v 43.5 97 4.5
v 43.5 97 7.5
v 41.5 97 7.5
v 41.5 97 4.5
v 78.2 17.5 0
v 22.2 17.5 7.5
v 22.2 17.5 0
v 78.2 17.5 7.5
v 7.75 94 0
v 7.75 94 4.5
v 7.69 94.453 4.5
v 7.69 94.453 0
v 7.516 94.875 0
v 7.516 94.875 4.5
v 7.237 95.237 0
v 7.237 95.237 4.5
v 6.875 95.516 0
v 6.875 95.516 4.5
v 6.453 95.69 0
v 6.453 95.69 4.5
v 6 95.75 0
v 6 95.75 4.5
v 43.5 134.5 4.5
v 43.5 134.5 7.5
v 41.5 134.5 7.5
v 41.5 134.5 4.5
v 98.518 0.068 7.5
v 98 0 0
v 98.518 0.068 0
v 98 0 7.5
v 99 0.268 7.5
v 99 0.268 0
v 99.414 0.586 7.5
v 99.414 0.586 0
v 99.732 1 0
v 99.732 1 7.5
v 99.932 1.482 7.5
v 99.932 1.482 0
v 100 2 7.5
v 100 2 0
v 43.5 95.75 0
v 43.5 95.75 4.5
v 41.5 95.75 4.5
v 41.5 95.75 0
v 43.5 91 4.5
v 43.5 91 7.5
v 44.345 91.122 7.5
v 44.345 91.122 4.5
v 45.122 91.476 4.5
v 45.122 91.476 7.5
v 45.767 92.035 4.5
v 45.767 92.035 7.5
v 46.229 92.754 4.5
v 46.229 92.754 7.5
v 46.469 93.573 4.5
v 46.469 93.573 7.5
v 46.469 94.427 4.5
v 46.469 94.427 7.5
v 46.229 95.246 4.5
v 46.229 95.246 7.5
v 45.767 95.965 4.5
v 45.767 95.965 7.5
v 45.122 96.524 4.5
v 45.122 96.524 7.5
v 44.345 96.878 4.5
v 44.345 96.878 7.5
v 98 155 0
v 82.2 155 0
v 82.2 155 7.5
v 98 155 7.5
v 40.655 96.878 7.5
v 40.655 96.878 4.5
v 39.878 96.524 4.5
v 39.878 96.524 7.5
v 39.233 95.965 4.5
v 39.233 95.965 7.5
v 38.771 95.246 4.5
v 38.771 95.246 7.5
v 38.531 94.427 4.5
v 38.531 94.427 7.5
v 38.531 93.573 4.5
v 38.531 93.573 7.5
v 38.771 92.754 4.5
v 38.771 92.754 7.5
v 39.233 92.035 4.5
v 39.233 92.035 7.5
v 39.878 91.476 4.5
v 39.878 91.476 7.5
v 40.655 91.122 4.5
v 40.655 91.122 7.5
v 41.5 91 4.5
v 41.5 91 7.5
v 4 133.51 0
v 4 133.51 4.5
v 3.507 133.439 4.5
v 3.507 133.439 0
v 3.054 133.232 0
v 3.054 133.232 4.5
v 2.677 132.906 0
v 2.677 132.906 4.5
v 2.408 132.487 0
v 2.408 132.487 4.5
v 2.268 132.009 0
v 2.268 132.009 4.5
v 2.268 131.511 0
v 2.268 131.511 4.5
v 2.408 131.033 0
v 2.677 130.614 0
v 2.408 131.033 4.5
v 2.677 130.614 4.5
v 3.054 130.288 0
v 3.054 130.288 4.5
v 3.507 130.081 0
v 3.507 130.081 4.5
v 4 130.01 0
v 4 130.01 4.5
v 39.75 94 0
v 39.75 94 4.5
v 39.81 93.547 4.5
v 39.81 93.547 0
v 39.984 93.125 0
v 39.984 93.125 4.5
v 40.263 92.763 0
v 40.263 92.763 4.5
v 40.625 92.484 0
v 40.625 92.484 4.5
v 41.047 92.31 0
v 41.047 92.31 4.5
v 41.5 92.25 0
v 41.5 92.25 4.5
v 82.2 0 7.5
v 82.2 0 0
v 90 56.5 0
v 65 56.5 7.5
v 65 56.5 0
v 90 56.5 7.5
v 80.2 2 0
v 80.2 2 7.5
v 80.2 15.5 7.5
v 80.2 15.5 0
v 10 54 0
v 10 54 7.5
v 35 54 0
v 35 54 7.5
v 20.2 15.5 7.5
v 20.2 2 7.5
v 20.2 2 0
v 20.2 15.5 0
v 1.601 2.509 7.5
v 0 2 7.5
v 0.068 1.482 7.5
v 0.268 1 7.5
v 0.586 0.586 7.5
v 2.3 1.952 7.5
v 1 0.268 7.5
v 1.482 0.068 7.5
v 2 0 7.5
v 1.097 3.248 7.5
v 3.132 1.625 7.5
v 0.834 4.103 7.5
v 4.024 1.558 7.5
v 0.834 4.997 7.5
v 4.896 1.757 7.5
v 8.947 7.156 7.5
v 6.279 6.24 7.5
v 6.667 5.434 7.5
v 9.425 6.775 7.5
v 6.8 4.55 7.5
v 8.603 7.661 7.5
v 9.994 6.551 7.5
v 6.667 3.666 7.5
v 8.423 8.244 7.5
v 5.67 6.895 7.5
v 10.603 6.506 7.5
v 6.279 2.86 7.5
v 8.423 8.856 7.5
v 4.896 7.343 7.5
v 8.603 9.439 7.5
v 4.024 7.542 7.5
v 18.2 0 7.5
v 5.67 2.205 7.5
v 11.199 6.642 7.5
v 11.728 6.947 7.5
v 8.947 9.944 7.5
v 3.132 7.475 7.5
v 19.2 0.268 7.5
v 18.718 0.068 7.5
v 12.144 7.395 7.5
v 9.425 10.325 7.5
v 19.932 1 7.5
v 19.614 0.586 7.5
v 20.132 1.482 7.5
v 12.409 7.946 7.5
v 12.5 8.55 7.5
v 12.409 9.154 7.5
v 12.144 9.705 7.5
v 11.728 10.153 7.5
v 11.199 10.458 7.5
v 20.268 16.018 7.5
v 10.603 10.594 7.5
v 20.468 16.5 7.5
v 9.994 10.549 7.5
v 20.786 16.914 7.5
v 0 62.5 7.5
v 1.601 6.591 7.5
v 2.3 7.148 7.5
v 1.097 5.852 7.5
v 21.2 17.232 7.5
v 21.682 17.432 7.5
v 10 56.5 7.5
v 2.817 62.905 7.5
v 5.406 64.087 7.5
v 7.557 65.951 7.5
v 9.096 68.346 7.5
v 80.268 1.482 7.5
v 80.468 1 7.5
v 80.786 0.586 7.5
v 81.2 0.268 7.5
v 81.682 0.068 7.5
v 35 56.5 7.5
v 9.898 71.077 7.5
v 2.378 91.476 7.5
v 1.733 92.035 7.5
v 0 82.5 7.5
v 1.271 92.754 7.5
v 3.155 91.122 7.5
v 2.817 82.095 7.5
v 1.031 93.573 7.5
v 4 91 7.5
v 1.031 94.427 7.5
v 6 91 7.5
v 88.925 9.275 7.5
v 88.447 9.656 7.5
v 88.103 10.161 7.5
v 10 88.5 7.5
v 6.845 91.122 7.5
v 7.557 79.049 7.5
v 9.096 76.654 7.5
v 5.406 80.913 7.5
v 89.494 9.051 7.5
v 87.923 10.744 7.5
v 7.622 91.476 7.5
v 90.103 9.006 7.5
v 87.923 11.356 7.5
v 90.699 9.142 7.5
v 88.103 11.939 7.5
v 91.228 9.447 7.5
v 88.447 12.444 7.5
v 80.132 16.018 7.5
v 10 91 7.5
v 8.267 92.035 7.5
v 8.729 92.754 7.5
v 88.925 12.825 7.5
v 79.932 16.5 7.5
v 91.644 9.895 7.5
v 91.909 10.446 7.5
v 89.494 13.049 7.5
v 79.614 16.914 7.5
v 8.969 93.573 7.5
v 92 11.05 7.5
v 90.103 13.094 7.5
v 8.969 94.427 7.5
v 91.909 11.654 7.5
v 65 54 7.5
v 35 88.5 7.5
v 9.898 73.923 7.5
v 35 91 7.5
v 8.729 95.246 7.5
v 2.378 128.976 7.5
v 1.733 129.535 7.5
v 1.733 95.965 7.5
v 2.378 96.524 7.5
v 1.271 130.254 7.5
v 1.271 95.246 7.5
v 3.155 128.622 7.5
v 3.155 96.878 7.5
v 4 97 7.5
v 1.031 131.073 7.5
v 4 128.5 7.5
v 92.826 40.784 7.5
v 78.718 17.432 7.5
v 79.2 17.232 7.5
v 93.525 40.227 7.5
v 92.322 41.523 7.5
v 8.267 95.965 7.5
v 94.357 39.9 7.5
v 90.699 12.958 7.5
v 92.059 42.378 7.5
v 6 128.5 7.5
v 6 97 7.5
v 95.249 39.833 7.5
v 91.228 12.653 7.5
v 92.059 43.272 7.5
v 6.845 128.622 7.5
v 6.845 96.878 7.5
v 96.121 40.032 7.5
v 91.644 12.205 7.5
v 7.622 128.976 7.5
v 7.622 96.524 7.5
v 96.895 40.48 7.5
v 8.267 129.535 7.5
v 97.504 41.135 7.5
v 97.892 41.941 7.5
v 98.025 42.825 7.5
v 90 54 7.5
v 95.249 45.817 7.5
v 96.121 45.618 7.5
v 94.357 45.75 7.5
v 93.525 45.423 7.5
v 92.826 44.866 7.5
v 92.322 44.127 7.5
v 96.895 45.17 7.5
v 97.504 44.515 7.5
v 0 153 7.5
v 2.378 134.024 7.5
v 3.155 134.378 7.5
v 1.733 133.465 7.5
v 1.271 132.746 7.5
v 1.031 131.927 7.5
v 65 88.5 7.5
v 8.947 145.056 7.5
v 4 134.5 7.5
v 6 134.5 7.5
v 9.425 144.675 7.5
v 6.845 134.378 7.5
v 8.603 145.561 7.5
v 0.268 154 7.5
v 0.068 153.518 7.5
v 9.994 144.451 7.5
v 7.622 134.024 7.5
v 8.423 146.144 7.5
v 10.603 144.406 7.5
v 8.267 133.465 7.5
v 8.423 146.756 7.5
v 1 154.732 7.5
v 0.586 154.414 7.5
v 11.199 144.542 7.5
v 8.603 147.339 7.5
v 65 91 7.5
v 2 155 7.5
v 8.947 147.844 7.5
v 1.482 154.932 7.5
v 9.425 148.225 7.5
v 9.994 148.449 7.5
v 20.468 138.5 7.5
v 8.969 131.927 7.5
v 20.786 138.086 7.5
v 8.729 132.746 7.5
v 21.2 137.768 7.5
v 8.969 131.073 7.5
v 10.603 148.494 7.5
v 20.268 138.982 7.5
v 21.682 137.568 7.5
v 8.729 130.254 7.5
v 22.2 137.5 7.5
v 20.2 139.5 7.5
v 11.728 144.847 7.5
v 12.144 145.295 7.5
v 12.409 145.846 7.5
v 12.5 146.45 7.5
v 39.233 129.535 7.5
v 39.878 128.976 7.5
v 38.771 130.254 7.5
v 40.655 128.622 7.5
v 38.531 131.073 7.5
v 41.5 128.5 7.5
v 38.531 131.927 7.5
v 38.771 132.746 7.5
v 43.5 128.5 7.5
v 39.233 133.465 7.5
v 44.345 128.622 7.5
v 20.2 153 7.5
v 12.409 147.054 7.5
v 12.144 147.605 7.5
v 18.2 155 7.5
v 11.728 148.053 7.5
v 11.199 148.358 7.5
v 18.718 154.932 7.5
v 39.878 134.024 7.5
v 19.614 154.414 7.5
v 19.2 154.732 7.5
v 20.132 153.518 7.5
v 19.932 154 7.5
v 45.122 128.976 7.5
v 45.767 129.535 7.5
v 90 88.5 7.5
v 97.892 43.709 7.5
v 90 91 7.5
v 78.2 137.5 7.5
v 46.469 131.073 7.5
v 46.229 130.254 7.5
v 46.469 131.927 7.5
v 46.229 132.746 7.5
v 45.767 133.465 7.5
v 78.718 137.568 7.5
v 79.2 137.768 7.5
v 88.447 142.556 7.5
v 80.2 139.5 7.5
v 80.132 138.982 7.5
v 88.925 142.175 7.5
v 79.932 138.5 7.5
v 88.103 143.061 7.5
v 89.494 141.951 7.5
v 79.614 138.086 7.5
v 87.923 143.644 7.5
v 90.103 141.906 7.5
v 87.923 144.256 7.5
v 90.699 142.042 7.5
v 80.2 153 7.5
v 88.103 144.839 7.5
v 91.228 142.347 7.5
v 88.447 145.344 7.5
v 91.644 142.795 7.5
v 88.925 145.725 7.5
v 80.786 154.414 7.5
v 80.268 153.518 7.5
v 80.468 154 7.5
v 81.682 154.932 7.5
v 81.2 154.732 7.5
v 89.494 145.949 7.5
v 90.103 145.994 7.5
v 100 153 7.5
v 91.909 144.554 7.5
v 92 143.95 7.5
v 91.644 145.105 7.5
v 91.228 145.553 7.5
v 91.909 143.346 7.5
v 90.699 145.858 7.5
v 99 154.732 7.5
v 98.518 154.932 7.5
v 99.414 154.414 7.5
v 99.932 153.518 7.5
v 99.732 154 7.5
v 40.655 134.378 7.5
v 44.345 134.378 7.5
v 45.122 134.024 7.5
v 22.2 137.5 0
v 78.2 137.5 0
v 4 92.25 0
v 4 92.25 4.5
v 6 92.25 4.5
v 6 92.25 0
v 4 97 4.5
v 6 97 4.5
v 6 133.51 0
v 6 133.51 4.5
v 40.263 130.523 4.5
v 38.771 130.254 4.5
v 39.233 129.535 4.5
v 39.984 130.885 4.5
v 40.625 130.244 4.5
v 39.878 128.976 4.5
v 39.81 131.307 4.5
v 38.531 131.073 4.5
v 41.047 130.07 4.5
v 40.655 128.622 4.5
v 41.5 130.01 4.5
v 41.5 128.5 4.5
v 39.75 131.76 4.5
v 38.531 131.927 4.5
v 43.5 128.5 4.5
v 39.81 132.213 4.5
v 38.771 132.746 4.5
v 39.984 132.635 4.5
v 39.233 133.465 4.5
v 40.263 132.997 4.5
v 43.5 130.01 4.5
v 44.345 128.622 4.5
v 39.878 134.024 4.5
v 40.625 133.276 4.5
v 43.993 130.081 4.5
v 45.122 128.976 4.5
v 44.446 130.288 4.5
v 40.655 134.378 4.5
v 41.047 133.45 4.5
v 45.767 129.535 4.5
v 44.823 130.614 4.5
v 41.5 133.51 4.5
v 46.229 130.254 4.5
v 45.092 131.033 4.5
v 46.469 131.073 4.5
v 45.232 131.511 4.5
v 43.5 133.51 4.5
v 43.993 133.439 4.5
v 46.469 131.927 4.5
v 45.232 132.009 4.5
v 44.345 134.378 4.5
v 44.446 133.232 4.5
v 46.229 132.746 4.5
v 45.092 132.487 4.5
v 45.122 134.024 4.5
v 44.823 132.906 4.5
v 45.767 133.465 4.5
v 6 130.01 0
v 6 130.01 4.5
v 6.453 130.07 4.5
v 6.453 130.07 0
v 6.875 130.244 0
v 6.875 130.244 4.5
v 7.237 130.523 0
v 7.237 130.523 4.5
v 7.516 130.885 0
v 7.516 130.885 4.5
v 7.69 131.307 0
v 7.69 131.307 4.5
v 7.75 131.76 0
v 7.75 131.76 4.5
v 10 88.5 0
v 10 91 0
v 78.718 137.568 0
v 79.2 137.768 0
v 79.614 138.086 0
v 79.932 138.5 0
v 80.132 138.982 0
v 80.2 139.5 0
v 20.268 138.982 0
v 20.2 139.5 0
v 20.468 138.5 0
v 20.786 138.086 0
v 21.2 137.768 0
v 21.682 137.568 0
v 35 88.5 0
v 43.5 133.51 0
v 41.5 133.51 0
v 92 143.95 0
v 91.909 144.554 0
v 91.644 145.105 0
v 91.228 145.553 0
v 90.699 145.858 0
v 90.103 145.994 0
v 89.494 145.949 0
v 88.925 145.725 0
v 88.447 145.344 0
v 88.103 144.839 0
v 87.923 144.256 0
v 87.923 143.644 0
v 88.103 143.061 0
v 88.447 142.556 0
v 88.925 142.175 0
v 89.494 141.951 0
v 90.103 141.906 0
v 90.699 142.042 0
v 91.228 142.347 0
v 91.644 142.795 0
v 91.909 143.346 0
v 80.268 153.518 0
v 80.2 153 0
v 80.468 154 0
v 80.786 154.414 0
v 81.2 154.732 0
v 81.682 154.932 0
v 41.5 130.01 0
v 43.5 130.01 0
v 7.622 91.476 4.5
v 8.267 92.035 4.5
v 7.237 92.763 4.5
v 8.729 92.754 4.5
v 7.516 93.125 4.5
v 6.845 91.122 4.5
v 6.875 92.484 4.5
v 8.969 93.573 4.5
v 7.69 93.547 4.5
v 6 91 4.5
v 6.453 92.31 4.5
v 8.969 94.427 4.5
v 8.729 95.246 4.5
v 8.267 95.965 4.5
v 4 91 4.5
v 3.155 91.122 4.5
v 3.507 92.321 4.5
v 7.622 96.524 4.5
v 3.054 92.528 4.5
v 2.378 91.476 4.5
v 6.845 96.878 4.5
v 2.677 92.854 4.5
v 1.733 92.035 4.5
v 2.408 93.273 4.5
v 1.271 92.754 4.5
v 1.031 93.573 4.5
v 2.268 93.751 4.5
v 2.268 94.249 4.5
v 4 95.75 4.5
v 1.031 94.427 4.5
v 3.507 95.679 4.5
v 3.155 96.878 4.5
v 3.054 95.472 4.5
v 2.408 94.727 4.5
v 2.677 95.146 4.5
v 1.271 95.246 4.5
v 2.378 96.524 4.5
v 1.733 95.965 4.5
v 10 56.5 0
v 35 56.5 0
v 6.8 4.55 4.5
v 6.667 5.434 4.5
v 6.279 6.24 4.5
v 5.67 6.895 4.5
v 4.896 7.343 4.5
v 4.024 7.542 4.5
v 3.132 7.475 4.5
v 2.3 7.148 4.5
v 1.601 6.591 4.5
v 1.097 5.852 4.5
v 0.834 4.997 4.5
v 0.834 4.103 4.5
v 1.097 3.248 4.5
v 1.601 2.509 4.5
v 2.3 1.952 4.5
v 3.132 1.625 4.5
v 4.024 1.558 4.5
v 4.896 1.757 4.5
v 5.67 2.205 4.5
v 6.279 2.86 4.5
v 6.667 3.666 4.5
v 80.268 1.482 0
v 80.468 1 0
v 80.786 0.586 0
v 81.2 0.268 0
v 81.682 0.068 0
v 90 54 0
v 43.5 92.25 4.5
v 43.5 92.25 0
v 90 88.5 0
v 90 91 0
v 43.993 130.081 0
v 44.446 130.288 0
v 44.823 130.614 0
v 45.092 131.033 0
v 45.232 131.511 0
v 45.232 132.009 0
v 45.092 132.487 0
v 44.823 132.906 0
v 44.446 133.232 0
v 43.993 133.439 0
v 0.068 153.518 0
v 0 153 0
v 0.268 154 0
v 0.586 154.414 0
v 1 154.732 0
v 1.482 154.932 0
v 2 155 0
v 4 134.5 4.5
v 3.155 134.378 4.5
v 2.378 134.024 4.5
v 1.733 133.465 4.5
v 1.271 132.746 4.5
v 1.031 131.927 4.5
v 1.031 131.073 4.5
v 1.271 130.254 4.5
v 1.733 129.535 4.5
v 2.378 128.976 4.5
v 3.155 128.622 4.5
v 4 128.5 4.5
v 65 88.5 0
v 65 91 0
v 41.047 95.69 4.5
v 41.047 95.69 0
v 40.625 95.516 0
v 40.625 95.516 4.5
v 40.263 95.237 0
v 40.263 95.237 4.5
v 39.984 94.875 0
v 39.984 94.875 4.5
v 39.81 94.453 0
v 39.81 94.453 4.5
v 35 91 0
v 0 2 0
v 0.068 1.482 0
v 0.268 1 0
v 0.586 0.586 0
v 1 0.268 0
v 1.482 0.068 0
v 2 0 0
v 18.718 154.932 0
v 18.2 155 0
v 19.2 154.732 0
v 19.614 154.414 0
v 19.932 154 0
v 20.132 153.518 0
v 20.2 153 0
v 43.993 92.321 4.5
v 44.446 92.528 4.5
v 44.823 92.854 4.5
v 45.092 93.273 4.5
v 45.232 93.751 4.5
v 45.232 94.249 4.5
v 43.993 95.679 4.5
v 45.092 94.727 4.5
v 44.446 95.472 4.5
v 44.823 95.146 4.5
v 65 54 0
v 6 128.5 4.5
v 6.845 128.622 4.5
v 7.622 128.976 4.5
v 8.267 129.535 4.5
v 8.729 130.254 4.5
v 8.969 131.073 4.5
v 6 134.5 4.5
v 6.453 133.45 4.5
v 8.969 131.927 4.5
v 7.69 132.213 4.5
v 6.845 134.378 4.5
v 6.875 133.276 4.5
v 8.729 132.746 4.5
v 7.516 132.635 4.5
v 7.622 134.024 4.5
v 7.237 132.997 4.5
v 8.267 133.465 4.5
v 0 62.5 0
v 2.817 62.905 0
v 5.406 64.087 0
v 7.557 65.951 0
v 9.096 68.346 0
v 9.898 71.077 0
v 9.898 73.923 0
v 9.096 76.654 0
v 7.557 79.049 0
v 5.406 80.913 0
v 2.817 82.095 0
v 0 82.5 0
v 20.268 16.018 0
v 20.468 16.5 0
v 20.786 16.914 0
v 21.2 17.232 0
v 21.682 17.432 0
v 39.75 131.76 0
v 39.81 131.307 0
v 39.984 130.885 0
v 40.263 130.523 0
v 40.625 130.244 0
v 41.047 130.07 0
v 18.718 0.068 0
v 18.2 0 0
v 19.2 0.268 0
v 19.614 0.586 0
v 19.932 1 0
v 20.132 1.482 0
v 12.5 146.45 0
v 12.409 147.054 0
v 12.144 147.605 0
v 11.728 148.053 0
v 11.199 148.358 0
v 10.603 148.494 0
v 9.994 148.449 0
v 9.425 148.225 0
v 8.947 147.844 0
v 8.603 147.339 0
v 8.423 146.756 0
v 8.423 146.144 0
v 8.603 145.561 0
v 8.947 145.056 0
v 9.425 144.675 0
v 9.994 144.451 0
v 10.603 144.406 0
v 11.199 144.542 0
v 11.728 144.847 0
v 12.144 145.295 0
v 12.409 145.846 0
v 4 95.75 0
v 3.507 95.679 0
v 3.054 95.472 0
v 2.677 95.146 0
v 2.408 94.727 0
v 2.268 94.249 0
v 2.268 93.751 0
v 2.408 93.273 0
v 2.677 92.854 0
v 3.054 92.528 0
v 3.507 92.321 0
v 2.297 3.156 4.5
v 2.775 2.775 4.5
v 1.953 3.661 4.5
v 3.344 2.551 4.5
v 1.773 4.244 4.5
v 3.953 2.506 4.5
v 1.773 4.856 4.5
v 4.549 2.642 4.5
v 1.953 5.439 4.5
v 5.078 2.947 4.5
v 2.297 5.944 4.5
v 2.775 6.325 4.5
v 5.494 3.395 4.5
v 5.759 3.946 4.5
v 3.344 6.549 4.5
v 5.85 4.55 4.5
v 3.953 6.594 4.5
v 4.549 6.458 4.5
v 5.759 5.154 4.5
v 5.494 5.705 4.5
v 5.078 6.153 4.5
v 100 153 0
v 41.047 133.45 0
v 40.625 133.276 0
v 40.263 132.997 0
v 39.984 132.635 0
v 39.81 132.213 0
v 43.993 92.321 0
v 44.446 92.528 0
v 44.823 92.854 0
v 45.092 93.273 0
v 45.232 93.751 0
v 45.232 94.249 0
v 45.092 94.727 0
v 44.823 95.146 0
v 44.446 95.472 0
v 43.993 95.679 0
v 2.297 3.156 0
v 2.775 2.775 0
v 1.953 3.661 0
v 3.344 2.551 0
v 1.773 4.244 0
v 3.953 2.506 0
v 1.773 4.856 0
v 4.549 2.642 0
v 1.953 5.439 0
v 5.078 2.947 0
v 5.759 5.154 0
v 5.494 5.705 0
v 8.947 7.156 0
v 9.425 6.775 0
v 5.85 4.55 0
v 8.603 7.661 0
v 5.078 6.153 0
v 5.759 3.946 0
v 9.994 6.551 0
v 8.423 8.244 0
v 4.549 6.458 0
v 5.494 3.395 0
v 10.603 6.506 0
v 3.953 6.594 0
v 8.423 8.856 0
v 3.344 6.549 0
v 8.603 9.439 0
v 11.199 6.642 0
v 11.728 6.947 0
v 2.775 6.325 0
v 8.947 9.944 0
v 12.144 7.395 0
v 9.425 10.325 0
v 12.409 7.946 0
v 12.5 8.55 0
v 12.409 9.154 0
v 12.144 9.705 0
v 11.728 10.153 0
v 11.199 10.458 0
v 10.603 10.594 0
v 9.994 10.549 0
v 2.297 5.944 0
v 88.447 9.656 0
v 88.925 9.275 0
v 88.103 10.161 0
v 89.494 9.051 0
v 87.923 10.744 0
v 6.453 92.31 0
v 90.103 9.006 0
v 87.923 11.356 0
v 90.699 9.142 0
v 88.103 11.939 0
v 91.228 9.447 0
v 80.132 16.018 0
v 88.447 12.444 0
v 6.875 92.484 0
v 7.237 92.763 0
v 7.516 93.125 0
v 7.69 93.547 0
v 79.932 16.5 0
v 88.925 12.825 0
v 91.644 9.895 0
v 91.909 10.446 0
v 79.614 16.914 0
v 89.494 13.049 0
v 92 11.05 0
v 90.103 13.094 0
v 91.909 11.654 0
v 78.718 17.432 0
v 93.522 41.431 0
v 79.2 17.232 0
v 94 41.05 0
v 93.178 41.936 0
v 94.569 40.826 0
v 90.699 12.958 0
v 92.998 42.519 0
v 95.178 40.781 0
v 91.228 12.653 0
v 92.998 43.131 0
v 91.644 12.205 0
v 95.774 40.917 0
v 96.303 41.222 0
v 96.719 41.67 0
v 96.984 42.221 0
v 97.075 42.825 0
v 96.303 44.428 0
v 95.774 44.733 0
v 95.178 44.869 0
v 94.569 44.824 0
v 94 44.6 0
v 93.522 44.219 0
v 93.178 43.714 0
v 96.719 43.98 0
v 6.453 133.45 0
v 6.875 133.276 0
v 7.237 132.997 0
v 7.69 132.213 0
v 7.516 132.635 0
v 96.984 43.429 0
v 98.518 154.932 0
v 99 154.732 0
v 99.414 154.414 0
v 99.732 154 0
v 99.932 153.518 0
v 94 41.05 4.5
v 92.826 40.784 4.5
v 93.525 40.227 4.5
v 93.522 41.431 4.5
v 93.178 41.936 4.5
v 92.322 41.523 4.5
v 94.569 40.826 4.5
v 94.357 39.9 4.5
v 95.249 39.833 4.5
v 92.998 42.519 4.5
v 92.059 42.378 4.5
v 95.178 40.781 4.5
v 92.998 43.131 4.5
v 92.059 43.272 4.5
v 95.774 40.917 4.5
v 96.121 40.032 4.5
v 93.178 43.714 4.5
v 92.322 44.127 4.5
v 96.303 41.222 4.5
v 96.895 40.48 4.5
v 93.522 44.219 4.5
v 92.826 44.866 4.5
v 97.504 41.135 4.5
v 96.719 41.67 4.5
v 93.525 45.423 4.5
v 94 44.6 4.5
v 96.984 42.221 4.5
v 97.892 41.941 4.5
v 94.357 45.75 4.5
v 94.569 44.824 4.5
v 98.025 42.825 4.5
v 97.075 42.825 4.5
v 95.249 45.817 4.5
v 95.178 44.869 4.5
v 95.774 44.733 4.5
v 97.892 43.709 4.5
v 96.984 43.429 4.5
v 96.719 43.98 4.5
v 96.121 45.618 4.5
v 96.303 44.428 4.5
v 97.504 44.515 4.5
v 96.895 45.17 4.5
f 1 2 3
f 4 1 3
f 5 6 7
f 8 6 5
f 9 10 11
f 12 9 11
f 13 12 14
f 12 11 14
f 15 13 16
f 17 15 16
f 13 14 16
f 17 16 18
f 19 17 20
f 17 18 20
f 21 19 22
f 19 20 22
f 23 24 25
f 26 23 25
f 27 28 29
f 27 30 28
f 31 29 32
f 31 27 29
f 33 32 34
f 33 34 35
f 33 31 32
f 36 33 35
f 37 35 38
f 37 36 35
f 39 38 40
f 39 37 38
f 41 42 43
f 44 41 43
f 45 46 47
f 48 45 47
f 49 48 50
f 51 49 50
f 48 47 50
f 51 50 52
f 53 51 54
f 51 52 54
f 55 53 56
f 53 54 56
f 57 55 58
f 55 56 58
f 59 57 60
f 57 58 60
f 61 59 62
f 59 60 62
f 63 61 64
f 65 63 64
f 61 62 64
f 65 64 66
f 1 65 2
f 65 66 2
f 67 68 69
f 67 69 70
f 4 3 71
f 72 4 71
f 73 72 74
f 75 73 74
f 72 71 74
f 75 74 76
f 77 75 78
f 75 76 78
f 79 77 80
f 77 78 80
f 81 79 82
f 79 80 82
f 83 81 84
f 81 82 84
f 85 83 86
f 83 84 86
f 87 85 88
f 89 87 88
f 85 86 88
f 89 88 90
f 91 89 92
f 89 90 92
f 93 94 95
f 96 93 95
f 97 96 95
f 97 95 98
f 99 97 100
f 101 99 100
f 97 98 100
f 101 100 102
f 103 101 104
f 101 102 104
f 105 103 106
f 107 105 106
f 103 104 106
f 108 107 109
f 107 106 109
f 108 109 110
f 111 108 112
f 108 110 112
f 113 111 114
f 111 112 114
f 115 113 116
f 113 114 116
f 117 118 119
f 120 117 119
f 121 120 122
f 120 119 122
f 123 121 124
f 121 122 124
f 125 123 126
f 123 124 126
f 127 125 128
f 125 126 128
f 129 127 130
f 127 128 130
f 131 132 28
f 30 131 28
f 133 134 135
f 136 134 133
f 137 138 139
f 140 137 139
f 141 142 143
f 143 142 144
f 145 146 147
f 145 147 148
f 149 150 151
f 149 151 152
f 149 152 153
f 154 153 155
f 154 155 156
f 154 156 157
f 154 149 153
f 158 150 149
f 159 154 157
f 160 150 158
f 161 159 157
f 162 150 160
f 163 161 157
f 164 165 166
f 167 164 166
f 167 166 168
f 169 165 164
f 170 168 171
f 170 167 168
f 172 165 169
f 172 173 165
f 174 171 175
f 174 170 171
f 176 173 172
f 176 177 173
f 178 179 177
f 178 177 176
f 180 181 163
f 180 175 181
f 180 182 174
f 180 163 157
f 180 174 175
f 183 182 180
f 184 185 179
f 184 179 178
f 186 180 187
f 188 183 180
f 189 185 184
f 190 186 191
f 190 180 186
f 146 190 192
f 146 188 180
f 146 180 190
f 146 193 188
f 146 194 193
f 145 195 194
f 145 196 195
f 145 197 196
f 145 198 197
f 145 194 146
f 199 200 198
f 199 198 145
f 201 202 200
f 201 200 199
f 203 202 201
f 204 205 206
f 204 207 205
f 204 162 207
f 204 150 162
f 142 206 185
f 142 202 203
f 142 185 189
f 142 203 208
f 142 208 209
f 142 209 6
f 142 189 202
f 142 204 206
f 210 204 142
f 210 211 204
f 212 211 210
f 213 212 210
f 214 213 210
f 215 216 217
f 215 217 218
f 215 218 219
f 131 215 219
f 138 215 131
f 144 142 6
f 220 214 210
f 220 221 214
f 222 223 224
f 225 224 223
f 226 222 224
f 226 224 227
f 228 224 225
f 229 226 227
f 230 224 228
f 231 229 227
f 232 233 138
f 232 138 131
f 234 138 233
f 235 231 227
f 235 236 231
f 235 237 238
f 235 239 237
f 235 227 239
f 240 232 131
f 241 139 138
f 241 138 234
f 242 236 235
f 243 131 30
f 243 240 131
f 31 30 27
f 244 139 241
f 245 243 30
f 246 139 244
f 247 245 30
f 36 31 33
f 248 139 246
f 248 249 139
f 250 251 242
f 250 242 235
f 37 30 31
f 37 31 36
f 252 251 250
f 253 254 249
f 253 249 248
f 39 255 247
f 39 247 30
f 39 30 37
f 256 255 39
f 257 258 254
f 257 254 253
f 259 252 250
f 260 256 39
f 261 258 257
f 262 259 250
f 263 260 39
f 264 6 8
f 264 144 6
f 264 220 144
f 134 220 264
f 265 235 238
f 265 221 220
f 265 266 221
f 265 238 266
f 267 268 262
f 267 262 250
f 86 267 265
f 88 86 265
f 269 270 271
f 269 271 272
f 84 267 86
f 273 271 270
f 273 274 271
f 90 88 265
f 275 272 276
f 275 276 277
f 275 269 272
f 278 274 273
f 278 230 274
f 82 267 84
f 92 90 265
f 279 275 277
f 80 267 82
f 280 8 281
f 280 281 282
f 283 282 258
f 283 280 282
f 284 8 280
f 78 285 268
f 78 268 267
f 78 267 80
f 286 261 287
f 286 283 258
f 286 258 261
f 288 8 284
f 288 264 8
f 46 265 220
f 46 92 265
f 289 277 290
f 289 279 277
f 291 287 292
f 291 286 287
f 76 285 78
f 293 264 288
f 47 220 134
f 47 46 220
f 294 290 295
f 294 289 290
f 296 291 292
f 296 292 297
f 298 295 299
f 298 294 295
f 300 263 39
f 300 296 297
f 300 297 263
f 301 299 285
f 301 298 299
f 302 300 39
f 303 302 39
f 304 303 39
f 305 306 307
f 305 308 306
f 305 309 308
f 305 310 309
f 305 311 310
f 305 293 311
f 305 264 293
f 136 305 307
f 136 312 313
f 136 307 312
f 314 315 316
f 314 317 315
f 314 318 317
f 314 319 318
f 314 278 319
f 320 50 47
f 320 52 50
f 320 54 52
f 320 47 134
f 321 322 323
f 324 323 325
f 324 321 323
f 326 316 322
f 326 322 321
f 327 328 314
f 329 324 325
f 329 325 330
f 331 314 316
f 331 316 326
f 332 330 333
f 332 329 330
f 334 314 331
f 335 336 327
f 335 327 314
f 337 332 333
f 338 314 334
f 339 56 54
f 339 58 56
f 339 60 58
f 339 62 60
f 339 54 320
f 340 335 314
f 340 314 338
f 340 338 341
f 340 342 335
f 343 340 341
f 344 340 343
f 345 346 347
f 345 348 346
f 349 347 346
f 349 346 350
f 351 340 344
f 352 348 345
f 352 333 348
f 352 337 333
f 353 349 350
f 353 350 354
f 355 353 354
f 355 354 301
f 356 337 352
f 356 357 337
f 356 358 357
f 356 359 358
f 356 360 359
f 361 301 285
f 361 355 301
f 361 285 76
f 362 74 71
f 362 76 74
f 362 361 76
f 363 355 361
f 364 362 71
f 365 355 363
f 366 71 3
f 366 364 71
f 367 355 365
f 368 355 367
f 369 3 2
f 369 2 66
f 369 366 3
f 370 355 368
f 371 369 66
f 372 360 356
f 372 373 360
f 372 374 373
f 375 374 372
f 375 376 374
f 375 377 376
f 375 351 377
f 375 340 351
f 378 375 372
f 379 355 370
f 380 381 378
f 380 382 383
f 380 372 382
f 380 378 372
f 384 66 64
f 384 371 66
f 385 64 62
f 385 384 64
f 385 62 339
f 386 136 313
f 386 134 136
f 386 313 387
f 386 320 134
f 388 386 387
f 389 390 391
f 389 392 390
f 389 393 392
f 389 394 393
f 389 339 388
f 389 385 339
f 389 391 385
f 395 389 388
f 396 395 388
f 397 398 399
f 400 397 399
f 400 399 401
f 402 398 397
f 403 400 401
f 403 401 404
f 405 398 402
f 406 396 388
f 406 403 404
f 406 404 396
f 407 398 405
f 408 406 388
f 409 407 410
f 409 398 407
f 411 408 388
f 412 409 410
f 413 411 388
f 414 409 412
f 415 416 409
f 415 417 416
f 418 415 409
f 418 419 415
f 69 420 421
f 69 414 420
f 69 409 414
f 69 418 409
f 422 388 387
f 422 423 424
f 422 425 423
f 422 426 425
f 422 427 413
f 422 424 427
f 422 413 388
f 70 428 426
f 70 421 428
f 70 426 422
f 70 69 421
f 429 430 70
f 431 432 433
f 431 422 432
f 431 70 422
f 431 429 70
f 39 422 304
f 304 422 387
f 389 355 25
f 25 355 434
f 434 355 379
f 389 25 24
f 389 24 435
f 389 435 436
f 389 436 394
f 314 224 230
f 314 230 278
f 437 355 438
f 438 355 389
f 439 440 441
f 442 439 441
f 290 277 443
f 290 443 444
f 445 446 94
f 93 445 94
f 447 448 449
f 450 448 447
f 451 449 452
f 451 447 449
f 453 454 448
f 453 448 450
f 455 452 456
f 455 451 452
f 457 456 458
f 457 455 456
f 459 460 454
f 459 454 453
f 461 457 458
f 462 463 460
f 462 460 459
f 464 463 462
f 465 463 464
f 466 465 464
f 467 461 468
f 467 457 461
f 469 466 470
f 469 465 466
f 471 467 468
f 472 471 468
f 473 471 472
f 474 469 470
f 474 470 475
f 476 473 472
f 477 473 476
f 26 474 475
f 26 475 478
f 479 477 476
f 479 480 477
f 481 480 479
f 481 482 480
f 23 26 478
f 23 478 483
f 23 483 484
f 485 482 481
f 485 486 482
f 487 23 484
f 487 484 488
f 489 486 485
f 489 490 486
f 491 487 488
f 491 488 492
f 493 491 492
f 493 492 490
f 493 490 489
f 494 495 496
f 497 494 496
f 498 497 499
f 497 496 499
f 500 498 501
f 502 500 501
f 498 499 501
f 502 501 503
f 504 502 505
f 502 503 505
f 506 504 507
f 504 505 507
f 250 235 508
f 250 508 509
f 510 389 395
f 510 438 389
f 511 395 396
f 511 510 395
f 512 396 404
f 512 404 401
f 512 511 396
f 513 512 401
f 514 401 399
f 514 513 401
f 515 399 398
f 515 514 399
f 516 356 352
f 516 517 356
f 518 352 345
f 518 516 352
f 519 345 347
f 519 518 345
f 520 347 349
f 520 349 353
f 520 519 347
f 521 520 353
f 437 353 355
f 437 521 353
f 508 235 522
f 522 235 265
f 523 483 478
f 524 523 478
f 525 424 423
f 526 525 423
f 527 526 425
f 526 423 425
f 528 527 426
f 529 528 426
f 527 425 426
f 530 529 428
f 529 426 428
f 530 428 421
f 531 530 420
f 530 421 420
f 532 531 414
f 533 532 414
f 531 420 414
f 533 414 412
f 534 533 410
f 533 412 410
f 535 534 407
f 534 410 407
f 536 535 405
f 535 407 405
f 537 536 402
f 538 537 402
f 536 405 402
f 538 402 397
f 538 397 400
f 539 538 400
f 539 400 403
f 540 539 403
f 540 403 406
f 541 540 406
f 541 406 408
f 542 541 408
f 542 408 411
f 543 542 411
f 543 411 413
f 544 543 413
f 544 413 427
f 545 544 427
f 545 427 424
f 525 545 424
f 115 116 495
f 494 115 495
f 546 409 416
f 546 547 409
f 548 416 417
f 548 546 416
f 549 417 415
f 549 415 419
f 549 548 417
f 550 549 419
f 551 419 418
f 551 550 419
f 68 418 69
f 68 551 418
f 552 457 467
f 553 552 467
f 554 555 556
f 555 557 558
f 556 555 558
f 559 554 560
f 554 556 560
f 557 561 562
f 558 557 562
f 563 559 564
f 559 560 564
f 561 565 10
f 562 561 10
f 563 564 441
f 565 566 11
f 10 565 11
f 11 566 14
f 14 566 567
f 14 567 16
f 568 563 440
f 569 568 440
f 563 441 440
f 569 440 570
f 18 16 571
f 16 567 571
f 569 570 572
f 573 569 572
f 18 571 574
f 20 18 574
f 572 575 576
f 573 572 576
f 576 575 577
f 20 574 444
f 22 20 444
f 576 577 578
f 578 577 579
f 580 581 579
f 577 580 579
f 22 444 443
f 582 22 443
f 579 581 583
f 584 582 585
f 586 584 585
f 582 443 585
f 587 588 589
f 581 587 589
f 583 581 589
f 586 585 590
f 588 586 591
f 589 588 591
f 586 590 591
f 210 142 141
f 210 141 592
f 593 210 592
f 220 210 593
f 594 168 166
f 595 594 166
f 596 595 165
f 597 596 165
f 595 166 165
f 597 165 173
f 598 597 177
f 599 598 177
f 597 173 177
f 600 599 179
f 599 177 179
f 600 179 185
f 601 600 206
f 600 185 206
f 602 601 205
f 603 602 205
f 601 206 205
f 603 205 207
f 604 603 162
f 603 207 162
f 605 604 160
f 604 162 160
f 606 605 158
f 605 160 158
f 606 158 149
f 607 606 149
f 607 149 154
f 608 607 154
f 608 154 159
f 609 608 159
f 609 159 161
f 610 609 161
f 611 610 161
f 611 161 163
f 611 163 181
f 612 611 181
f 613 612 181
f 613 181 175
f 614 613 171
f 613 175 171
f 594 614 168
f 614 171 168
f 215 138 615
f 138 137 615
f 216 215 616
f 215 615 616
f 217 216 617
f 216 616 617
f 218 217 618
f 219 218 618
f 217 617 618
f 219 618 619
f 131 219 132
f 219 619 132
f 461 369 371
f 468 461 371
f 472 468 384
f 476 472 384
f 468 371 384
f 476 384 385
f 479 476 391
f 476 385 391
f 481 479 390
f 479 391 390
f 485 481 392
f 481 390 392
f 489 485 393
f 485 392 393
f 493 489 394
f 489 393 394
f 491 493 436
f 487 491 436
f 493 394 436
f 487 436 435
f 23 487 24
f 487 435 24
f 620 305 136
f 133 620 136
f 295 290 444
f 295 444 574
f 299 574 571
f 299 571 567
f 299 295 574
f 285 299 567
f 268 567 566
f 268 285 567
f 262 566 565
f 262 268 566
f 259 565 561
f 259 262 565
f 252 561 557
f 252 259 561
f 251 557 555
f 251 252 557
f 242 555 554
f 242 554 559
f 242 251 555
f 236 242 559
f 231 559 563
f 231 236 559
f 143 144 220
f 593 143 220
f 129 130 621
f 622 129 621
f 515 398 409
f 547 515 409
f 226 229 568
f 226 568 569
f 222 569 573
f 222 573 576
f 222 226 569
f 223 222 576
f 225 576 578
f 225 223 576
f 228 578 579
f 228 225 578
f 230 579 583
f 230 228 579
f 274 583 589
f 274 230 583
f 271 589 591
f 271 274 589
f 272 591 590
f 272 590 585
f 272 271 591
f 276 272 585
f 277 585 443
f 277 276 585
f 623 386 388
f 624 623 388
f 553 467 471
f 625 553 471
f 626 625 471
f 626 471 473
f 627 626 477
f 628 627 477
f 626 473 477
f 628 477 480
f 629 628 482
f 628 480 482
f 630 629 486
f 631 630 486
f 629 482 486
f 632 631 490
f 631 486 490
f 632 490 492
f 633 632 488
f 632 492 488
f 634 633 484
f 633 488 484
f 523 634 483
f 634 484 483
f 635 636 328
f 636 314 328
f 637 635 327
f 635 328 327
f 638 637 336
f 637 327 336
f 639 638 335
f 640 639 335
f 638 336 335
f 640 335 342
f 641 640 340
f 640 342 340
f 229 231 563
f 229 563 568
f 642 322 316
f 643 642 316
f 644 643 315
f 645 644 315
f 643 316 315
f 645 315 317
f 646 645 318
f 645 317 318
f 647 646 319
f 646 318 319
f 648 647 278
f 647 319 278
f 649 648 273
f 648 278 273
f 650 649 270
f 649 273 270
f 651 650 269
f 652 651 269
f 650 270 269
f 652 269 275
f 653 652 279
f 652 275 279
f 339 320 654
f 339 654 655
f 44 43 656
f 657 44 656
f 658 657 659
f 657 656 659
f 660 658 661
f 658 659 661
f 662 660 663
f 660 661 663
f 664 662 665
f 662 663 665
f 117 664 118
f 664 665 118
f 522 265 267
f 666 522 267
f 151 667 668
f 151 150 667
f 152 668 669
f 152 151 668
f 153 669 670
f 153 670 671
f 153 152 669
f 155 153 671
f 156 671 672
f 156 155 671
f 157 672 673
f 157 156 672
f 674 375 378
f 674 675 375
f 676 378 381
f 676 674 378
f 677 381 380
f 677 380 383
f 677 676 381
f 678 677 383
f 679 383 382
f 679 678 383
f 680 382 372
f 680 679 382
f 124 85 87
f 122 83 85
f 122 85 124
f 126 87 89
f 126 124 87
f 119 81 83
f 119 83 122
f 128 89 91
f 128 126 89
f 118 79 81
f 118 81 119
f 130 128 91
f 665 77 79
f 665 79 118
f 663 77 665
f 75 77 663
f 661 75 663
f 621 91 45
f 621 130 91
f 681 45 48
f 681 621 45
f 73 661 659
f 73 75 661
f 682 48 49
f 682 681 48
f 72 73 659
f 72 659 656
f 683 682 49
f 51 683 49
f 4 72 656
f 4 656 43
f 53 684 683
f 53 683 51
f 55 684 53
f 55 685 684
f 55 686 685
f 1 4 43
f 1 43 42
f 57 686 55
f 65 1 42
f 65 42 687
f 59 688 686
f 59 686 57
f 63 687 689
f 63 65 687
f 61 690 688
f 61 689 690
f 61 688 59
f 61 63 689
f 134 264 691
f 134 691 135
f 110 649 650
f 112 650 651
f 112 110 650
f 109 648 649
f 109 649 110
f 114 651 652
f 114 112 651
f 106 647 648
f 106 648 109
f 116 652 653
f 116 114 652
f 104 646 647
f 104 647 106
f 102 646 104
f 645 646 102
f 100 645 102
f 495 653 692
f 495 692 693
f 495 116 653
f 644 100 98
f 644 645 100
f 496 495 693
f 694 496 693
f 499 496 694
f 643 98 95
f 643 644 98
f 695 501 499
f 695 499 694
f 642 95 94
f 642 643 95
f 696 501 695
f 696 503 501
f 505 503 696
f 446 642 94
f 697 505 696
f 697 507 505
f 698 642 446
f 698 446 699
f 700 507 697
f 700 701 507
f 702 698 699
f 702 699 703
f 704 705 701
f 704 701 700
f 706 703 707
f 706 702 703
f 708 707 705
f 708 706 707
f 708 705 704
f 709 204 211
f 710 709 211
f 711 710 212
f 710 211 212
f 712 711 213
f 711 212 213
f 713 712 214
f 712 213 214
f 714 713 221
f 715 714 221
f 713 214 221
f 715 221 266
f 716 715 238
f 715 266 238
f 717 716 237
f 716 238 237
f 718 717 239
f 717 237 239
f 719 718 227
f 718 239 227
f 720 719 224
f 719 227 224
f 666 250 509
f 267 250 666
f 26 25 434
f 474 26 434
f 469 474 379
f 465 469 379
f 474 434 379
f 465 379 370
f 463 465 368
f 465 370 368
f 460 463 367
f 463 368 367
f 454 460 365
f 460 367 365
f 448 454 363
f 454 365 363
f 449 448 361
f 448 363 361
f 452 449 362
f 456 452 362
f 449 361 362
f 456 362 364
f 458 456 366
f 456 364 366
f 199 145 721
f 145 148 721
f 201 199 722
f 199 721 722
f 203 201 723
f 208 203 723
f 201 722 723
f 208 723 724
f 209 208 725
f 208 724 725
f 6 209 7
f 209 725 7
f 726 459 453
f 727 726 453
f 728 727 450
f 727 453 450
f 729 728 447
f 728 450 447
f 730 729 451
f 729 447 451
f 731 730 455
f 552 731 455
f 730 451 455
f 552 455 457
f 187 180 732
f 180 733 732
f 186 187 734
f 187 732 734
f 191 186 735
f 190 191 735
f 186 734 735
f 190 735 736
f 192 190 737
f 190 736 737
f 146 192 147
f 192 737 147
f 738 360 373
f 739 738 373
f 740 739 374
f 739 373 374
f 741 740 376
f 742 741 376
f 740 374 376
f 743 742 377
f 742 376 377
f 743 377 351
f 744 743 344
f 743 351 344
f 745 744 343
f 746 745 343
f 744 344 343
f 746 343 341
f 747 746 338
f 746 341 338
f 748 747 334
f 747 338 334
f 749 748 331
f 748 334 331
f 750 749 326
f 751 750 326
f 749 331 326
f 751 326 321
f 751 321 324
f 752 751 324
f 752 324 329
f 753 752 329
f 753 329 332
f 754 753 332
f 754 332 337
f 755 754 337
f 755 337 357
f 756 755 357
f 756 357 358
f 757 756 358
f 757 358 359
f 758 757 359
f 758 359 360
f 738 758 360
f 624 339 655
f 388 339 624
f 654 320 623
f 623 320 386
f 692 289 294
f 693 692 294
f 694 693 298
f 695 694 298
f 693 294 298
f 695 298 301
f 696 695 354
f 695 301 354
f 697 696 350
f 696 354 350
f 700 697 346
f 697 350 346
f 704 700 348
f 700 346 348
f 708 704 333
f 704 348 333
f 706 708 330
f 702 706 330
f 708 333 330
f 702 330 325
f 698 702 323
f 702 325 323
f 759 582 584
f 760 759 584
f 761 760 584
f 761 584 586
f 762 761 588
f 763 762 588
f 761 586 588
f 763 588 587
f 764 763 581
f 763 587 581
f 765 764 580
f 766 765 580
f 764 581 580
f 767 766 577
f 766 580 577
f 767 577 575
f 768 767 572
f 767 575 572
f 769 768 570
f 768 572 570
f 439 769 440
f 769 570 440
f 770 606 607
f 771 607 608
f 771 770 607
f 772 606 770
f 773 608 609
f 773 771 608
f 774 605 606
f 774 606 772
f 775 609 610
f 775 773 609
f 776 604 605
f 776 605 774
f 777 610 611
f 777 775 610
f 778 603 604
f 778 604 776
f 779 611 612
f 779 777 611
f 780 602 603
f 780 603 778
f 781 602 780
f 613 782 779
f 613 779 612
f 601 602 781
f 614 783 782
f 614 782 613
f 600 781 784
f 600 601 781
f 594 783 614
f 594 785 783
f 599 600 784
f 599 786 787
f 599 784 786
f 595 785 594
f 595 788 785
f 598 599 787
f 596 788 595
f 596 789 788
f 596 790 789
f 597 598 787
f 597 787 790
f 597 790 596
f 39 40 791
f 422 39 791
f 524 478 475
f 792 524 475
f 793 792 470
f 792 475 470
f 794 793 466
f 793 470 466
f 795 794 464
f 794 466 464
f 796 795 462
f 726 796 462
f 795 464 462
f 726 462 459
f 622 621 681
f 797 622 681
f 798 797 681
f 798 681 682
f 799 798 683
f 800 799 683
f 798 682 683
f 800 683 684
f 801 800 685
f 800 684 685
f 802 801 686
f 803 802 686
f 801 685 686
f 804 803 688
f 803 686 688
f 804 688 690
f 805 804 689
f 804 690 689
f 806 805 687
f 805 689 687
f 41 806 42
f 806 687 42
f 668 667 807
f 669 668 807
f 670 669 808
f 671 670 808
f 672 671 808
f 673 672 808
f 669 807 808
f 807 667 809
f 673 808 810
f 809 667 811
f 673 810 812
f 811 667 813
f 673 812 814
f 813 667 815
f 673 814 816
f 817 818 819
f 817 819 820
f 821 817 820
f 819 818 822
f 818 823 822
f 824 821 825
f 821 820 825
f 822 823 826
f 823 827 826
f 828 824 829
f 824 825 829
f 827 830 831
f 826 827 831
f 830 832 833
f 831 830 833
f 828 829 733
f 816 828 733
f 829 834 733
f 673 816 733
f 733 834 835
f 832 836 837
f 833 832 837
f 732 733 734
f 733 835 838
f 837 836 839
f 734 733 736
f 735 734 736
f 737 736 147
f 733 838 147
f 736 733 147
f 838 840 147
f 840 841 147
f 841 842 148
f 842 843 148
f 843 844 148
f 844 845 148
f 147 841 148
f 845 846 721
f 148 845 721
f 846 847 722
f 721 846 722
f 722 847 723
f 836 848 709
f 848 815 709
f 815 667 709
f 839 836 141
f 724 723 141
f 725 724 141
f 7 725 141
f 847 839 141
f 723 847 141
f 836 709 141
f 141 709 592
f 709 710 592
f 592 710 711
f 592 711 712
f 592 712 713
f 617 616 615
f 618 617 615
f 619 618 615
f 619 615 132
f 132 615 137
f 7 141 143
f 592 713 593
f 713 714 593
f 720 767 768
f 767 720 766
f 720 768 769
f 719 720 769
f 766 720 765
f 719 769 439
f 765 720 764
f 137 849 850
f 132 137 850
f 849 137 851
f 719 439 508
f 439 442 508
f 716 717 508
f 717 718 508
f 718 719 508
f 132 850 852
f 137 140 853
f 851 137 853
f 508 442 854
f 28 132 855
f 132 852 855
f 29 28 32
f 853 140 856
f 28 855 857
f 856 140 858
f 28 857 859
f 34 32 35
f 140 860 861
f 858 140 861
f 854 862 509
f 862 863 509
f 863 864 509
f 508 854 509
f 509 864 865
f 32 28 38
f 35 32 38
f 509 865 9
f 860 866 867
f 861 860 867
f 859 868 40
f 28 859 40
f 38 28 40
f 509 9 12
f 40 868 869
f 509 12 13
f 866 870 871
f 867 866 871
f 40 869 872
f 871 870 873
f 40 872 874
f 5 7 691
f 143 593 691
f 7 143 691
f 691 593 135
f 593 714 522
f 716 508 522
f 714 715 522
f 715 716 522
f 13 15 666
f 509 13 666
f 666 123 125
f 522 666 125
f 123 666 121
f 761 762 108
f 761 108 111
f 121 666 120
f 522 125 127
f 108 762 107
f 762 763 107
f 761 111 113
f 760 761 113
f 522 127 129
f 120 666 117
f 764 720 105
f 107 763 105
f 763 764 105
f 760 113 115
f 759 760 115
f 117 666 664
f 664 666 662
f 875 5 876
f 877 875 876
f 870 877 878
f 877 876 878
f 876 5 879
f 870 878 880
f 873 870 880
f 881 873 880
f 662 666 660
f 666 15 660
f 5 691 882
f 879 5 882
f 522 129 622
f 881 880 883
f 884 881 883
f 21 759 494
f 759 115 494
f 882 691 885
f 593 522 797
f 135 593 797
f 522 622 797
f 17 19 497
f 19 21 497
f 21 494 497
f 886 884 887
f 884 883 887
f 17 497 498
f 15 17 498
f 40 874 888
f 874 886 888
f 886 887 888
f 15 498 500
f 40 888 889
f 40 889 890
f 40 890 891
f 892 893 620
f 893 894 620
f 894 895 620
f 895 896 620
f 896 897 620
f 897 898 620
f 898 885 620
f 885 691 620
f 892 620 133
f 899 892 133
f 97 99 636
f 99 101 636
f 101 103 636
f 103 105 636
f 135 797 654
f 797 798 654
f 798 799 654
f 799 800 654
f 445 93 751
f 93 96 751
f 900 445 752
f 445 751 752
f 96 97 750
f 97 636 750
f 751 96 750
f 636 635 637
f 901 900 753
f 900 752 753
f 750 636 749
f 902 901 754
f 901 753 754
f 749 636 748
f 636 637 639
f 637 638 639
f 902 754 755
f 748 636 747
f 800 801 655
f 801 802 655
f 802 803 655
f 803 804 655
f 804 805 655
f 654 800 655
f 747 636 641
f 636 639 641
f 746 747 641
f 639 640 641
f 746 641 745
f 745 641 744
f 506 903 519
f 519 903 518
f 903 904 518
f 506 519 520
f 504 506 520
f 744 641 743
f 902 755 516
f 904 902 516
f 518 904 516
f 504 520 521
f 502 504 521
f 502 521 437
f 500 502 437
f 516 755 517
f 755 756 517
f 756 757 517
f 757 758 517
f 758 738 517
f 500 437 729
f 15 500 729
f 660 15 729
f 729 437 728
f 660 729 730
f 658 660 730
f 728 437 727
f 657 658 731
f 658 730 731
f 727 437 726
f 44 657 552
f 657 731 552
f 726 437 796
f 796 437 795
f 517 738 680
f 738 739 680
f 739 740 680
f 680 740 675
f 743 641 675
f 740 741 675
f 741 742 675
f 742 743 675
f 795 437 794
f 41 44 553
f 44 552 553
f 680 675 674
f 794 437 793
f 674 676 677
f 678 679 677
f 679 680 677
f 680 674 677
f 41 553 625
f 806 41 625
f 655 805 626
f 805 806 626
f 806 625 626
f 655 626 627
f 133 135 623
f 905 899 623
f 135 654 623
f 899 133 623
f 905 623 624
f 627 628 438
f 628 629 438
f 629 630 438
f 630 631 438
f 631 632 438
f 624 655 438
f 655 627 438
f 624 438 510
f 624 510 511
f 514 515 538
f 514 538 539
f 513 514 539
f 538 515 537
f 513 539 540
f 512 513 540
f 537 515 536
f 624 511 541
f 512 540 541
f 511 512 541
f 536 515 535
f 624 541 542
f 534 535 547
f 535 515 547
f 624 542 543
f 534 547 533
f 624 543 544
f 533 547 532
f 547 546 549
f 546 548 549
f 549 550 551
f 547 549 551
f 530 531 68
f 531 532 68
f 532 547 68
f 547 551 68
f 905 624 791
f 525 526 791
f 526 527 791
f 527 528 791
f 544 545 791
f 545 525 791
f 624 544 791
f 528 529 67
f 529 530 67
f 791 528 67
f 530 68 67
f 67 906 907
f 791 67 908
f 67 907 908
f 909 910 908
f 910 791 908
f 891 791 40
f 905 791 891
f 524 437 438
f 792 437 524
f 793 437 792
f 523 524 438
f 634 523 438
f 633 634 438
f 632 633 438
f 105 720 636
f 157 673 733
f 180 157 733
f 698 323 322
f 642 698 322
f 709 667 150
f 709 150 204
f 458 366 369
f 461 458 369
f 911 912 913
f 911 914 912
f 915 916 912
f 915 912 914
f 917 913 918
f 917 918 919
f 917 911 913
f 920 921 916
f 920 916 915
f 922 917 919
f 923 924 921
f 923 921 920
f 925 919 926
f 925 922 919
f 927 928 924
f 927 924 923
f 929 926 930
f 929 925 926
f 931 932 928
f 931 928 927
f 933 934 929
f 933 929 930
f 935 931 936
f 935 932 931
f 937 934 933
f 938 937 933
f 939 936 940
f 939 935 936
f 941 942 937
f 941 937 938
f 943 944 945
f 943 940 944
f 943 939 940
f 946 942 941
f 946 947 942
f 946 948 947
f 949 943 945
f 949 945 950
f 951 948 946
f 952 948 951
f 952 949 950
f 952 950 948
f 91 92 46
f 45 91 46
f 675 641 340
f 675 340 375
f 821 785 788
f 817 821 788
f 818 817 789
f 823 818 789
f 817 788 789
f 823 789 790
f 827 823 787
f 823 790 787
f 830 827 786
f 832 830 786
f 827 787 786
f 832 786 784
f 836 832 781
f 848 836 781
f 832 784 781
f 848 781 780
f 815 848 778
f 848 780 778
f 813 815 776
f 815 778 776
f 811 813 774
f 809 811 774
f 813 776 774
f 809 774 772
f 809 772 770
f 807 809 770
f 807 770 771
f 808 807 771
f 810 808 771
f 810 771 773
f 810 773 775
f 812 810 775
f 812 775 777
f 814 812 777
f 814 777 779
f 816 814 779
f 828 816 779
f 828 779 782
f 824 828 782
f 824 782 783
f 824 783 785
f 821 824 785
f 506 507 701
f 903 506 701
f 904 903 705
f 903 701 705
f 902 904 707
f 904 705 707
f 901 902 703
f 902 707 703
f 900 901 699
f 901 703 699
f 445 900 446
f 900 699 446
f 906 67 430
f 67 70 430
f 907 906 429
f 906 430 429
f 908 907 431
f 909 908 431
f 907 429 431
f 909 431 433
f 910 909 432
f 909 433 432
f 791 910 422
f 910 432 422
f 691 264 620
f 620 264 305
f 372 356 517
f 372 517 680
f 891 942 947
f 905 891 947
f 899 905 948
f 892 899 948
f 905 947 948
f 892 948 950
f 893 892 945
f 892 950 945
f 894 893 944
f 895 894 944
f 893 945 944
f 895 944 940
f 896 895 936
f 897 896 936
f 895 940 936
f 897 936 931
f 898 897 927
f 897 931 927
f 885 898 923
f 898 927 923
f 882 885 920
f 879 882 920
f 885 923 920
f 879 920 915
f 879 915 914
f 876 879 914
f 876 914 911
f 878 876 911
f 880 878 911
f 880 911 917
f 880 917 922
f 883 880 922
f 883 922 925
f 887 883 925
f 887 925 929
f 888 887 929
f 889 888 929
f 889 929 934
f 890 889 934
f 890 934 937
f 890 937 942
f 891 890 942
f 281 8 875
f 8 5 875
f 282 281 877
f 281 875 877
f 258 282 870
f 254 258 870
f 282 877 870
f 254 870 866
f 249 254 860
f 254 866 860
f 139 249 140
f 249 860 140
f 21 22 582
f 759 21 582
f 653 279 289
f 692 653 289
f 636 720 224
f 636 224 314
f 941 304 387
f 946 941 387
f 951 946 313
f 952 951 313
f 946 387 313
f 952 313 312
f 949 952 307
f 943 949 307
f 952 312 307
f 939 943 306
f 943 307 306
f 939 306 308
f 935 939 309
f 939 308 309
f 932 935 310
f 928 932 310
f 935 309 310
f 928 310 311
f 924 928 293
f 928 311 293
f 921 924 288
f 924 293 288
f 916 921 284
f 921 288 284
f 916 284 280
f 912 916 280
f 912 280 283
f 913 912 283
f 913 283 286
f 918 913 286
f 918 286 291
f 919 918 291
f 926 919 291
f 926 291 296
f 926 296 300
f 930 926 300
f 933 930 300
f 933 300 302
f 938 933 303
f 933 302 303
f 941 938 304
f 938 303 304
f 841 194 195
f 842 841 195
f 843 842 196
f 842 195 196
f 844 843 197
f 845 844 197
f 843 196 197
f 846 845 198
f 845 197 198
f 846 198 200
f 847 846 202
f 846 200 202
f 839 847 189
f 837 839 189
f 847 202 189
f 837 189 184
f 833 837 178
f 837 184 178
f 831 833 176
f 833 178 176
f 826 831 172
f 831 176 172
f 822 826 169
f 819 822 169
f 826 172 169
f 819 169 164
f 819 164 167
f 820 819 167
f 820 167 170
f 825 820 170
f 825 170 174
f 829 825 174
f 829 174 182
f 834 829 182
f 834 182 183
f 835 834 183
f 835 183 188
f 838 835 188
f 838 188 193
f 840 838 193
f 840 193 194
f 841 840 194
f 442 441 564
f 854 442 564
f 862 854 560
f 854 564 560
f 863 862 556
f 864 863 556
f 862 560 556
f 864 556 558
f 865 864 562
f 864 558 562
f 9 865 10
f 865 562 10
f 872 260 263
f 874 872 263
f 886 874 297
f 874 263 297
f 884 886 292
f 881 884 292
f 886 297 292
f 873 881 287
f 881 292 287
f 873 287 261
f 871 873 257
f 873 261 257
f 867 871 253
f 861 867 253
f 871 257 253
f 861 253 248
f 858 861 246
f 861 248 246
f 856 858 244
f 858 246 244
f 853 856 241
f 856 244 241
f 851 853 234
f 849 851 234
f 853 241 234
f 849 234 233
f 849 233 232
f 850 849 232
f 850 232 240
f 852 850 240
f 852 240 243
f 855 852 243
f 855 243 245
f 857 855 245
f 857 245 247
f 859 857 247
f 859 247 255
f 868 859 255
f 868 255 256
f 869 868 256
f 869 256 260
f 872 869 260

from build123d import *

# Parameters (mm, degrees)
SKETCH1_W                 = 100
SKETCH1_H                 = 155
BOSS_EXTRUDE1_DEPTH       = 7.5
SKETCH2_R                 = 2.05
SKETCH2_W                 = 60
SKETCH2_H                 = 17.5
HOLE_CUTOUTS_DEPTH        = 8.5
SKETCH3_W                 = 25
SKETCH3_H                 = 2.5
BATTERY_STRAP_HOLES_DEPTH = 8.5
H_BRIDGE_HOLES_DEPTH      = 7.5
FILLET1_R                 = 2
CAMERA_WIRE_HOLE_DEPTH    = 8.5
SKETCH10_R                = 2.05
CUT_EXTRUDE1_DEPTH        = 7.5
SKETCH11_R                = 3
CUT_EXTRUDE2_DEPTH        = 3


with BuildPart() as part:
    # Sketch1 → Boss-Extrude1 (new body)
    with BuildSketch(Plane.XY):
        with Locations((50, 77.5)):
            Rectangle(SKETCH1_W, SKETCH1_H)
    extrude(amount=BOSS_EXTRUDE1_DEPTH)

    # Sketch2 → Hole cutouts (cut, through all)
    with BuildSketch(Plane.XY.offset(7.5)):
        with Locations((10.45, 146.45)):
            Circle(SKETCH2_R)
        with Locations((89.95, 143.95)):
            Circle(SKETCH2_R)
        with Locations((89.95, 11.05)):
            Circle(SKETCH2_R)
        with Locations((10.45, 8.55)):
            Circle(SKETCH2_R)
        with Locations((50.2, 146.25)):
            Rectangle(SKETCH2_W, SKETCH2_H)
        with Locations((50.2, 8.75)):
            Rectangle(SKETCH2_W, SKETCH2_H)
    extrude(amount=-HOLE_CUTOUTS_DEPTH, mode=Mode.SUBTRACT)

    # Sketch3 → Battery strap holes (cut, through all)
    with BuildSketch(Plane.XY.offset(7.5)):
        with Locations((22.5, 89.75)):
            Rectangle(SKETCH3_W, SKETCH3_H)
        with Locations((77.5, 89.75)):
            Rectangle(SKETCH3_W, SKETCH3_H)
        with Locations((22.5, 55.25)):
            Rectangle(SKETCH3_W, SKETCH3_H)
        with Locations((77.5, 55.25)):
            Rectangle(SKETCH3_W, SKETCH3_H)
    extrude(amount=-BATTERY_STRAP_HOLES_DEPTH, mode=Mode.SUBTRACT)

    # Sketch4 → H-Bridge Holes (cut)
    with BuildSketch(Plane.XY.offset(7.5)):
        with BuildLine():
            Line((6, 133.51), (4, 133.51))
            ThreePointArc((4, 133.51), (2.25, 131.76), (4, 130.01))
            Line((4, 130.01), (5, 130.01))
            Line((5, 130.01), (5, 131.76))
            Line((5, 131.76), (7.75, 131.76))
            ThreePointArc((7.75, 131.76), (7.237436867, 132.997436867), (6, 133.51))
        make_face()
        with BuildLine():
            ThreePointArc((6, 130.01), (7.237436867, 130.522563133), (7.75, 131.76))
            Line((7.75, 131.76), (5, 131.76))
            Line((5, 131.76), (5, 130.01))
            Line((5, 130.01), (6, 130.01))
        make_face()
        with BuildLine():
            Line((42.5, 131.76), (39.75, 131.76))
            ThreePointArc((39.75, 131.76), (40.262563133, 130.522563133), (41.5, 130.01))
            Line((41.5, 130.01), (42.5, 130.01))
            Line((42.5, 130.01), (42.5, 131.76))
        make_face()
        with BuildLine():
            ThreePointArc((41.5, 133.51), (40.262563133, 132.997436867), (39.75, 131.76))
            Line((39.75, 131.76), (42.5, 131.76))
            Line((42.5, 131.76), (42.5, 130.01))
            Line((42.5, 130.01), (43.5, 130.01))
            ThreePointArc((43.5, 130.01), (45.25, 131.76), (43.5, 133.51))
            Line((43.5, 133.51), (41.5, 133.51))
        make_face()
        with BuildLine():
            Line((5, 94), (5, 95.75))
            Line((5, 95.75), (4, 95.75))
            ThreePointArc((4, 95.75), (2.25, 94), (4, 92.25))
            Line((4, 92.25), (6, 92.25))
            ThreePointArc((6, 92.25), (7.237436867, 92.762563133), (7.75, 94))
            Line((7.75, 94), (5, 94))
        make_face()
        with BuildLine():
            Line((6, 95.75), (5, 95.75))
            Line((5, 95.75), (5, 94))
            Line((5, 94), (7.75, 94))
            ThreePointArc((7.75, 94), (7.237436867, 95.237436867), (6, 95.75))
        make_face()
        with BuildLine():
            Line((43.5, 95.75), (42.5, 95.75))
            Line((42.5, 95.75), (42.5, 94))
            Line((42.5, 94), (39.75, 94))
            ThreePointArc((39.75, 94), (40.262563133, 92.762563133), (41.5, 92.25))
            Line((41.5, 92.25), (43.5, 92.25))
            ThreePointArc((43.5, 92.25), (45.25, 94), (43.5, 95.75))
        make_face()
        with BuildLine():
            Line((42.5, 94), (42.5, 95.75))
            Line((42.5, 95.75), (41.5, 95.75))
            ThreePointArc((41.5, 95.75), (40.262563133, 95.237436867), (39.75, 94))
            Line((39.75, 94), (42.5, 94))
        make_face()
    extrude(amount=-H_BRIDGE_HOLES_DEPTH, mode=Mode.SUBTRACT)

    # Fillet1
    fillet1_edges = [part.edges().sort_by_distance(p)[0] for p in [
        (20.2, 0, 3.75),
        (20.2, 17.5, 3.75),
        (80.2, 17.5, 3.75),
        (80.2, 0, 3.75),
        (20.2, 137.5, 3.75),
        (20.2, 155, 3.75),
        (80.2, 155, 3.75),
        (80.2, 137.5, 3.75),
        (0, 155, 3.75),
        (100, 155, 3.75),
        (100, 0, 3.75),
        (0, 0, 3.75),
    ]]
    fillet(fillet1_edges, radius=FILLET1_R)

    # Sketch9 → Camera Wire Hole (cut, through all)
    with BuildSketch(Plane.XY.offset(7.5)):
        with BuildLine():
            Line((0, 82.5), (0, 62.5))
            ThreePointArc((0, 62.5), (10, 72.5), (0, 82.5))
        make_face()
    extrude(amount=-CAMERA_WIRE_HOLE_DEPTH, mode=Mode.SUBTRACT)

    # Sketch10 → Cut-Extrude1 (cut)
    with BuildSketch(Plane.XY.offset(7.5)):
        with Locations((3.8, 4.55)):
            Circle(SKETCH10_R)
        with Locations((95.025, 42.825)):
            Circle(SKETCH10_R)
    extrude(amount=-CUT_EXTRUDE1_DEPTH, mode=Mode.SUBTRACT)

    # Sketch11 → Cut-Extrude2 (cut)
    with BuildSketch(Plane.XY.offset(7.5)):
        with Locations((3.8, 4.55)):
            Circle(SKETCH11_R)
        with Locations((95.025, 42.825)):
            Circle(SKETCH11_R)
        with BuildLine():
            Line((4, 97), (6, 97))
            ThreePointArc((6, 97), (9, 94), (6, 91))
            Line((6, 91), (4, 91))
            ThreePointArc((4, 91), (1, 94), (4, 97))
        make_face()
        with BuildLine():
            Line((41.5, 91), (43.5, 91))
            ThreePointArc((43.5, 91), (46.5, 94), (43.5, 97))
            Line((43.5, 97), (41.5, 97))
            ThreePointArc((41.5, 97), (38.5, 94), (41.5, 91))
        make_face()
        with BuildLine():
            Line((41.5, 128.5), (43.5, 128.5))
            ThreePointArc((43.5, 128.5), (46.5, 131.5), (43.5, 134.5))
            Line((43.5, 134.5), (41.5, 134.5))
            ThreePointArc((41.5, 134.5), (38.5, 131.5), (41.5, 128.5))
        make_face()
        with BuildLine():
            Line((4, 128.5), (6, 128.5))
            ThreePointArc((6, 128.5), (9, 131.5), (6, 134.5))
            Line((6, 134.5), (4, 134.5))
            ThreePointArc((4, 134.5), (1, 131.5), (4, 128.5))
        make_face()
    extrude(amount=-CUT_EXTRUDE2_DEPTH, mode=Mode.SUBTRACT)


solid = part.part
